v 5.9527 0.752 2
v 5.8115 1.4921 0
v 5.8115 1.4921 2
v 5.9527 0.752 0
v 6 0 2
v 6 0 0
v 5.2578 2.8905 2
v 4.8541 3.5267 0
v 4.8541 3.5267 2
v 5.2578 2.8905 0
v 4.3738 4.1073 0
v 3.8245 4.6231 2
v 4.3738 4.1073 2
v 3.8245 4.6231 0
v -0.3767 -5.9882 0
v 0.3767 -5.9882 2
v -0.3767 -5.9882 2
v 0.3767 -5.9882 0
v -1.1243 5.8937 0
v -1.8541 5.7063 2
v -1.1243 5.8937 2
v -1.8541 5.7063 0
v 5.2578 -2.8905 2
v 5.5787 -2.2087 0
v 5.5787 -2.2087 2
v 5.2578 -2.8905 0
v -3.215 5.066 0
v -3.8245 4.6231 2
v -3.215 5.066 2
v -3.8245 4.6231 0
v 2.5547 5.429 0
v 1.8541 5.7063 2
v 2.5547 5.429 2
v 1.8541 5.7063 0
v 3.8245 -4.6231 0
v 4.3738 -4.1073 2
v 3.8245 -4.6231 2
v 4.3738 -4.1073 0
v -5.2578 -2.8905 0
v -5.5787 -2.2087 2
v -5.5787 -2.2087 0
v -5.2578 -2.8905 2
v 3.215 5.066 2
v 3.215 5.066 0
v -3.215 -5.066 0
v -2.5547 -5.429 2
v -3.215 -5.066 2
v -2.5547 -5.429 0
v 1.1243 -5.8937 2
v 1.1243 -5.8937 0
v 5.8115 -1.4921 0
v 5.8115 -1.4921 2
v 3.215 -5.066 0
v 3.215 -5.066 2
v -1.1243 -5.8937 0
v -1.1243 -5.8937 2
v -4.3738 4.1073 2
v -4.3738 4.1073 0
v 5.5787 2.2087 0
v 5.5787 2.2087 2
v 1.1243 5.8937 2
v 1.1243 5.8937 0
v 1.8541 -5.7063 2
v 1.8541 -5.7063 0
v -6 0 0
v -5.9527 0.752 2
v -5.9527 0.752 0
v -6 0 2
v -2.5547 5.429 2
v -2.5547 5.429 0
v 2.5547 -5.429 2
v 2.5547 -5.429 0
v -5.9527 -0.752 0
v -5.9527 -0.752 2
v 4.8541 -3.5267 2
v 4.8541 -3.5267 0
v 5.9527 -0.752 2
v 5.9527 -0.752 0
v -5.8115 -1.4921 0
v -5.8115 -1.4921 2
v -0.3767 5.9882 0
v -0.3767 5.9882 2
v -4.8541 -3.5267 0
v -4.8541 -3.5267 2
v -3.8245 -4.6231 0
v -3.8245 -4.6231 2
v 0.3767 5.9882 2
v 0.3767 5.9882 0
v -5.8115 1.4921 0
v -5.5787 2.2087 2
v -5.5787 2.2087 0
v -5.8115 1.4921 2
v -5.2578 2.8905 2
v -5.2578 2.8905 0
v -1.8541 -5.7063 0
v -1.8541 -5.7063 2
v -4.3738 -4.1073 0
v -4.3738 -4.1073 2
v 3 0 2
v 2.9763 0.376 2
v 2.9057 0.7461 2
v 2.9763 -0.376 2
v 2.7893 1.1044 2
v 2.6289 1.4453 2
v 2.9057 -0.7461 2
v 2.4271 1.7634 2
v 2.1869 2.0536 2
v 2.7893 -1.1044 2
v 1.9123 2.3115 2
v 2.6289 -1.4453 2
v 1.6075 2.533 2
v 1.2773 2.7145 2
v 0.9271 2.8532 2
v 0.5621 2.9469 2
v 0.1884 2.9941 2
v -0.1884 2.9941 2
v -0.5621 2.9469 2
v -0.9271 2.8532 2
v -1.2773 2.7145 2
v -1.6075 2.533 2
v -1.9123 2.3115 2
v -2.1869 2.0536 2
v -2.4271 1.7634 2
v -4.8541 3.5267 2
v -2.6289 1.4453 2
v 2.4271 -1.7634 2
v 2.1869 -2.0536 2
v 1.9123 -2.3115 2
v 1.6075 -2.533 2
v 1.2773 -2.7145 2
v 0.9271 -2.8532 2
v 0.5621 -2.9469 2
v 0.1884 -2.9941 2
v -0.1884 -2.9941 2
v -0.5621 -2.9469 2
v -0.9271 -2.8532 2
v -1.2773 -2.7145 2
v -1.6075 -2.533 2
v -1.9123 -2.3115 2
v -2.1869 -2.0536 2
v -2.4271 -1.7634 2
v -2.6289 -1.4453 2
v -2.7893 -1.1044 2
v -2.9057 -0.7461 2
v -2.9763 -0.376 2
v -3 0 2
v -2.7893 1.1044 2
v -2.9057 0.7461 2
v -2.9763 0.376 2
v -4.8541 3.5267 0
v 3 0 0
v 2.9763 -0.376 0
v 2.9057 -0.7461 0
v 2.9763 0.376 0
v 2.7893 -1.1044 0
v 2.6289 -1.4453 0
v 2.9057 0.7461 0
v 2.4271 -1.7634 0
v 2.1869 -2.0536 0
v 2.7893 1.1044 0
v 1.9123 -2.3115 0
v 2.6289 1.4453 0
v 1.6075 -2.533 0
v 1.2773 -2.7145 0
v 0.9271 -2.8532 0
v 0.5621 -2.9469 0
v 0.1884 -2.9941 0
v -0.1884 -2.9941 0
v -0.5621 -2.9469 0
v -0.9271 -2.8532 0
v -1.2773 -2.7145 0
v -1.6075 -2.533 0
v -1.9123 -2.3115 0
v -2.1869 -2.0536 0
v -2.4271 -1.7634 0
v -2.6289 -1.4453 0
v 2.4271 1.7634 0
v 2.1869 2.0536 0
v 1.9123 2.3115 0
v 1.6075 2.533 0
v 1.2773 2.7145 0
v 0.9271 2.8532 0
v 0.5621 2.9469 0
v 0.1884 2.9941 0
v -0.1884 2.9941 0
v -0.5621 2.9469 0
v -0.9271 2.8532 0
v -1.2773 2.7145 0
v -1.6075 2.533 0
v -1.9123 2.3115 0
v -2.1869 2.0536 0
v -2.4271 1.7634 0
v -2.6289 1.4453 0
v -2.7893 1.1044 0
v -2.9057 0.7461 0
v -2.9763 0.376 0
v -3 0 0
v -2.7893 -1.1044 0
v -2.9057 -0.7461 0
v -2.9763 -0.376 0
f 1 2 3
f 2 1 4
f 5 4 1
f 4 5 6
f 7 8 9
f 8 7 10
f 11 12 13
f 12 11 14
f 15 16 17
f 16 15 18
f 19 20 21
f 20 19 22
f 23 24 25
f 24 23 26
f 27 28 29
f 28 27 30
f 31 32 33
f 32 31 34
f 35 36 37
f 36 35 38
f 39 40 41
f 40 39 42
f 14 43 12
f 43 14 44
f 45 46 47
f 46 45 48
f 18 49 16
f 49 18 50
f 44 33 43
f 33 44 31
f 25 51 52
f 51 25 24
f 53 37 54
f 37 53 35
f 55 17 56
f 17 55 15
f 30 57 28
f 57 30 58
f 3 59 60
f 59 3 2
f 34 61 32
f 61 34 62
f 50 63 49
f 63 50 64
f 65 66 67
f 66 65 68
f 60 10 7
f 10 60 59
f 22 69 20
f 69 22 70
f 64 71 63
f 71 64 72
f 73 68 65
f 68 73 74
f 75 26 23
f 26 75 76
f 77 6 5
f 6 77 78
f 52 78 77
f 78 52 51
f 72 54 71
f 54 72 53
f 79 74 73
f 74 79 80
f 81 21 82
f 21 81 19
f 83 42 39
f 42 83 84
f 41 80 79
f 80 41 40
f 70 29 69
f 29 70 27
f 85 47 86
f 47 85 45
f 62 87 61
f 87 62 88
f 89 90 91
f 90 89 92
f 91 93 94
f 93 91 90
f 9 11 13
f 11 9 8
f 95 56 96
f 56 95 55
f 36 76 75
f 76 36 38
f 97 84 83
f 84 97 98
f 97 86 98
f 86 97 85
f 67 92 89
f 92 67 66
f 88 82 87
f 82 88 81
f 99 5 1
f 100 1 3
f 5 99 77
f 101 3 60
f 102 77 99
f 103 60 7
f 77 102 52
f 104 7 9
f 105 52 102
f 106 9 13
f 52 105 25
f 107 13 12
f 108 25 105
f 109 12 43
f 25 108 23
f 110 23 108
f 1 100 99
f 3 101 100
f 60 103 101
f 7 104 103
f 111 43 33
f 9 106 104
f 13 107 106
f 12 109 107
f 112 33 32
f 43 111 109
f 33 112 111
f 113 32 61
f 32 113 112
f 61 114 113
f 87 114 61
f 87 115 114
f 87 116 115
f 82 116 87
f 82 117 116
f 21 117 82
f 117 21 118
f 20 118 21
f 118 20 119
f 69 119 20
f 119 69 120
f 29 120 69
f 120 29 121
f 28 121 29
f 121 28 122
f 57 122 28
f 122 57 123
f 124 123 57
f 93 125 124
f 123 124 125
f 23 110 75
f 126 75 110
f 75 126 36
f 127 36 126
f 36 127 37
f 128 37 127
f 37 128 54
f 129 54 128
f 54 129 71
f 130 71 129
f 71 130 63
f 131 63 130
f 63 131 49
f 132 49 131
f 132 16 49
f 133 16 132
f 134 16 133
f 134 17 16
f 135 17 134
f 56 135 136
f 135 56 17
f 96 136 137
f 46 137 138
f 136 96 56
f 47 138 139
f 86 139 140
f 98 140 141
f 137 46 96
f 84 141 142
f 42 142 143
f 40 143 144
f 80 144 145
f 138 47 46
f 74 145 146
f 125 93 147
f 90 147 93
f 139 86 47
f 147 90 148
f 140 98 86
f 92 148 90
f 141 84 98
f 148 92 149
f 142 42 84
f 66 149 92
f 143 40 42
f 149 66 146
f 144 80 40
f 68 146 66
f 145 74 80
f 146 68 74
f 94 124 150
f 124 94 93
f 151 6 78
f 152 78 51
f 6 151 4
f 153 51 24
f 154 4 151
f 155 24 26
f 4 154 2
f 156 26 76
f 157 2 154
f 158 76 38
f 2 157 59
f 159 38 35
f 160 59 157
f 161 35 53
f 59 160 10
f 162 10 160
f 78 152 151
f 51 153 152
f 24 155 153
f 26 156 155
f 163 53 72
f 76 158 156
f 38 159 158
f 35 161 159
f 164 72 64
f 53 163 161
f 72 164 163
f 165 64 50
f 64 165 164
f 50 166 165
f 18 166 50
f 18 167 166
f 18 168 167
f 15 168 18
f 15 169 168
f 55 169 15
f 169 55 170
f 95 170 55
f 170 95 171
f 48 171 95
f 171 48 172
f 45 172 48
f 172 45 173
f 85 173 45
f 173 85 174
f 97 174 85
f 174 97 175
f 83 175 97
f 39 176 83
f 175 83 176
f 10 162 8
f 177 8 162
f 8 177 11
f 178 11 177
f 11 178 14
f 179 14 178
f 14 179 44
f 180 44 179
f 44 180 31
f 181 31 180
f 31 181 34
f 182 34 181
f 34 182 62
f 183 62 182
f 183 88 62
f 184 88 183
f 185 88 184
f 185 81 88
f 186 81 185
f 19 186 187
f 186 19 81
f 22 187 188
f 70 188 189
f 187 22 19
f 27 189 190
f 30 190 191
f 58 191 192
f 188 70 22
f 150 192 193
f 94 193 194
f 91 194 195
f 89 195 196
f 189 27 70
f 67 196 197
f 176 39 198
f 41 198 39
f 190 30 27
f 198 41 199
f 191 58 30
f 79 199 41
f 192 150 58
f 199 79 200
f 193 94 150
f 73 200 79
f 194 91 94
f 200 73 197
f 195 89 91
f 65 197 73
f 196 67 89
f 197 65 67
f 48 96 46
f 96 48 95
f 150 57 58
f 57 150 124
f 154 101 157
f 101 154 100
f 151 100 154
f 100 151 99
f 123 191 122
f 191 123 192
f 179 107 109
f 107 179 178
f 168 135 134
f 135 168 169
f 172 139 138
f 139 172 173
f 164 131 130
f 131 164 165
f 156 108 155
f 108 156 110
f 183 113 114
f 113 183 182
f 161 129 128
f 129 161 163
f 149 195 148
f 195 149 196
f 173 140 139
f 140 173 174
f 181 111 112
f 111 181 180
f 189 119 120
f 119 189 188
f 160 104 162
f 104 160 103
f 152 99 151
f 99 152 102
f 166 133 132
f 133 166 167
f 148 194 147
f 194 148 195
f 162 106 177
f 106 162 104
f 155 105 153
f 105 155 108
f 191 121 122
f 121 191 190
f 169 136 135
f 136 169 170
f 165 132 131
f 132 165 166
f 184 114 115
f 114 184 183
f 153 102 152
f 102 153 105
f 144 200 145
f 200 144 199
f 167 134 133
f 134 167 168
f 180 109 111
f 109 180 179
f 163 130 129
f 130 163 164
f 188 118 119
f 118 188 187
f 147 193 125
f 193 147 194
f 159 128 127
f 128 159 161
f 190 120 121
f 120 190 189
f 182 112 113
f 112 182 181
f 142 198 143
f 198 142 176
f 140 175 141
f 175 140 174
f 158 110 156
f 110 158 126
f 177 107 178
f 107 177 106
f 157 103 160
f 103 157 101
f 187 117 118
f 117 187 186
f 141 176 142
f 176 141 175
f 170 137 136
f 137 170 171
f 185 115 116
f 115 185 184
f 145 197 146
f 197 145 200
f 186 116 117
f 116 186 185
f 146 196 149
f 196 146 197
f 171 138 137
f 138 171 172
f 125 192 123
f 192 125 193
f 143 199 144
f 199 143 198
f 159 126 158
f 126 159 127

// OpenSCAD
difference(){
    cylinder(2,r=6,$fn=50);
    cylinder(2,r=3,$fn=50);
}
